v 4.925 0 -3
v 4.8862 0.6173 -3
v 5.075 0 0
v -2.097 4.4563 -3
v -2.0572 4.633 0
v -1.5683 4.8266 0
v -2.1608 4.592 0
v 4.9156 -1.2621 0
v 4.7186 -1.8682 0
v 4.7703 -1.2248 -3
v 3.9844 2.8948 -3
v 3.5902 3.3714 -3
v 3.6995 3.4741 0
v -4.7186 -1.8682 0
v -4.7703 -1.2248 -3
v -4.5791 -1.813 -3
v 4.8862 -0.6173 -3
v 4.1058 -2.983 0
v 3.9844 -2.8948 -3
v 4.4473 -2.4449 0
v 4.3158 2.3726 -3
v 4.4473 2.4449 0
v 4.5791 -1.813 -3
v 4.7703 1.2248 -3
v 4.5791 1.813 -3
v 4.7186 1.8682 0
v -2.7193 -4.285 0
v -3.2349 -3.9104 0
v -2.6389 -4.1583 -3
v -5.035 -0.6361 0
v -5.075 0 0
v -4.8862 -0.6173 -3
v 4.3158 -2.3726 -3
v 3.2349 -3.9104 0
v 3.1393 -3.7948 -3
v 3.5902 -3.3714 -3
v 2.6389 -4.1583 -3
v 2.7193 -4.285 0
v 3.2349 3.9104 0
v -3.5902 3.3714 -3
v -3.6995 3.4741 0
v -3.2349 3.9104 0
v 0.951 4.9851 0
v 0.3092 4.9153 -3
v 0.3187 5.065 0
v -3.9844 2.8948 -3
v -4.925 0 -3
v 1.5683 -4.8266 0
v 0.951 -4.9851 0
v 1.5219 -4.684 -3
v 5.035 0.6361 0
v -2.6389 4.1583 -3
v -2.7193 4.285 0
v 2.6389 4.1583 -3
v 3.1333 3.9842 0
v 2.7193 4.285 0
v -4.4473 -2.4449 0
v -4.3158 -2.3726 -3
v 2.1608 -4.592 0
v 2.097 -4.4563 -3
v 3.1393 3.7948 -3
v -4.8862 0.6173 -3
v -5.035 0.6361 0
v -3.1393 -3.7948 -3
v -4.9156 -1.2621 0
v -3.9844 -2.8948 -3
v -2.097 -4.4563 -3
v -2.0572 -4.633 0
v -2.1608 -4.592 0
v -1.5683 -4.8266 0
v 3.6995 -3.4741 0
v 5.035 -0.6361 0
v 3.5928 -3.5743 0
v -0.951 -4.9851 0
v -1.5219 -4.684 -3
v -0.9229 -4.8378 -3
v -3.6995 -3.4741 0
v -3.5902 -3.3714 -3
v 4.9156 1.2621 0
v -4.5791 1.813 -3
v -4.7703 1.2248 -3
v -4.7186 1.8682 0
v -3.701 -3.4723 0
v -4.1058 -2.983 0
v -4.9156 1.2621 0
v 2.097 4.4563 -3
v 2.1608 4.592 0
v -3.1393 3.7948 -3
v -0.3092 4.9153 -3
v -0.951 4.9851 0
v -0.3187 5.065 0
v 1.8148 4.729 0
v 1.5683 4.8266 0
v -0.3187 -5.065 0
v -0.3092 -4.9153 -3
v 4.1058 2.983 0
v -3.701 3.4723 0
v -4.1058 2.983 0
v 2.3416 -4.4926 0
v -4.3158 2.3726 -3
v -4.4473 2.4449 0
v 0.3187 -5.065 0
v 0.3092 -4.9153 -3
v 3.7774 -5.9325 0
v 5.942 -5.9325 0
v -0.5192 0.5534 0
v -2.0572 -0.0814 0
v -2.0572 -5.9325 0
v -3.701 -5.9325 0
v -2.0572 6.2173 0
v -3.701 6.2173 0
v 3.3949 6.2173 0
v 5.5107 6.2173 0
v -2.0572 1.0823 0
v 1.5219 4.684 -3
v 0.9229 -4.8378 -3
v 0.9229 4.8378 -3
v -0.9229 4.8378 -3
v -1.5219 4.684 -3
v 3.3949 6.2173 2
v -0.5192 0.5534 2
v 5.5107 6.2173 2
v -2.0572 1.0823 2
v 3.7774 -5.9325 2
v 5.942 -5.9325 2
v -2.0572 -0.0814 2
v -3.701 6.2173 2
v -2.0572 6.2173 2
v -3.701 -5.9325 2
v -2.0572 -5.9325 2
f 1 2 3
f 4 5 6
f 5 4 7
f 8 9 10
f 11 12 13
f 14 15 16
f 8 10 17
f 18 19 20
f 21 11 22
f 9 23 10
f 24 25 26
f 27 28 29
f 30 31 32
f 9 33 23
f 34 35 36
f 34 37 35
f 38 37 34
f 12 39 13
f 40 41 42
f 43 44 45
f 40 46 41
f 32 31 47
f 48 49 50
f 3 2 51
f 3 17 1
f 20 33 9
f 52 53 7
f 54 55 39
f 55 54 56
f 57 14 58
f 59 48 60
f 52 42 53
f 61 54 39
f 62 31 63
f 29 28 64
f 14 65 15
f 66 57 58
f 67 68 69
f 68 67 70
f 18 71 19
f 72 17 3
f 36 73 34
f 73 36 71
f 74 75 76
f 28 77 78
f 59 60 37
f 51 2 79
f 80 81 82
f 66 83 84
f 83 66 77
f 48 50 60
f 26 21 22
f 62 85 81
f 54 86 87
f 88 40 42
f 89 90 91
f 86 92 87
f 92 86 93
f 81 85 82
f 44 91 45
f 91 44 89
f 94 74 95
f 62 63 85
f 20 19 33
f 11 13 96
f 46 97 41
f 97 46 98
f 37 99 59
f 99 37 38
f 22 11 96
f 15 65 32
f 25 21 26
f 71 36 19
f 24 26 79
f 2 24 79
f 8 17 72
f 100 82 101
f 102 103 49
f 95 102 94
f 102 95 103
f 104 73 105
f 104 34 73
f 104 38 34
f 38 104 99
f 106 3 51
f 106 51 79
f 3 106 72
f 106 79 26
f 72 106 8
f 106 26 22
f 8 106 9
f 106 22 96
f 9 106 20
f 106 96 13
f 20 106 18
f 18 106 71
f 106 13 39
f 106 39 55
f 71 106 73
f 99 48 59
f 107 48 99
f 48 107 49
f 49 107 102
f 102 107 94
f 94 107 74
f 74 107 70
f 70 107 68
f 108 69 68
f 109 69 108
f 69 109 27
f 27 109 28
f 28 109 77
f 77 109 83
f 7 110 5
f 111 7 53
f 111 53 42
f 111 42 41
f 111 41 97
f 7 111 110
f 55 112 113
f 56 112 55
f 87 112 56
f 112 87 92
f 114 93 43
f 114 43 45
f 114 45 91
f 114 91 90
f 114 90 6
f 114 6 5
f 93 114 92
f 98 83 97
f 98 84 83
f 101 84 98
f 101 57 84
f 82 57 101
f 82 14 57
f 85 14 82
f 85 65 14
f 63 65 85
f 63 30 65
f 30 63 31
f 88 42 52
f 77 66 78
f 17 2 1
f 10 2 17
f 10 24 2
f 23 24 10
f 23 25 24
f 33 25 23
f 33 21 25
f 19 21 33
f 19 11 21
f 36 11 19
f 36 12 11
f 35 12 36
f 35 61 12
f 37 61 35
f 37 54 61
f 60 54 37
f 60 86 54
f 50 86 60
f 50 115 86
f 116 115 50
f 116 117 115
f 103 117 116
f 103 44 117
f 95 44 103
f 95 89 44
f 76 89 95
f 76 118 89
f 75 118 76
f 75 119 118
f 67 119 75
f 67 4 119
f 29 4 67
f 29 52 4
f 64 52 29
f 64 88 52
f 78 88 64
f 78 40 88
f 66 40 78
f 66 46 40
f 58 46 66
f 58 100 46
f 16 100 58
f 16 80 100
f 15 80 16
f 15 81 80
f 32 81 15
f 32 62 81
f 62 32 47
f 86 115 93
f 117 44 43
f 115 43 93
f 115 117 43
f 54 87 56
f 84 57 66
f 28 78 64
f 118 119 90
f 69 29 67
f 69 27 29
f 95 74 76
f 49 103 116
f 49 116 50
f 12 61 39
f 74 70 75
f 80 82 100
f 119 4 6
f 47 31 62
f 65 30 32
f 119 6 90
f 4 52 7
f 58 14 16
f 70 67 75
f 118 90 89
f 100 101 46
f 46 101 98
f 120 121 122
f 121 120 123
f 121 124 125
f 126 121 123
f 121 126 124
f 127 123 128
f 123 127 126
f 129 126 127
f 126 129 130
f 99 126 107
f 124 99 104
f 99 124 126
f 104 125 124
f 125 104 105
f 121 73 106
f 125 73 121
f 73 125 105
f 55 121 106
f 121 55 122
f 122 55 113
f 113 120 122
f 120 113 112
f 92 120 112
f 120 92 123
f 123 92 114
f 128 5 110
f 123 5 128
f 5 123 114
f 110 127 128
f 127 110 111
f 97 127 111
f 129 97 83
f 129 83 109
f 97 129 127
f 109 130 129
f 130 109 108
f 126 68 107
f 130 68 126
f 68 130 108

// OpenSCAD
$fn = 50;


difference() {
	union() {
		translate(v = [0, 0, -3.0000000000]) {
			cylinder(h = 3, r1 = 4.9250000000, r2 = 5.0750000000);
		}
		linear_extrude(height = 2) {
			text(font = "Impact", halign = "center", size = 12, text = "K", valign = "center");
		}
	}
	union();
}
